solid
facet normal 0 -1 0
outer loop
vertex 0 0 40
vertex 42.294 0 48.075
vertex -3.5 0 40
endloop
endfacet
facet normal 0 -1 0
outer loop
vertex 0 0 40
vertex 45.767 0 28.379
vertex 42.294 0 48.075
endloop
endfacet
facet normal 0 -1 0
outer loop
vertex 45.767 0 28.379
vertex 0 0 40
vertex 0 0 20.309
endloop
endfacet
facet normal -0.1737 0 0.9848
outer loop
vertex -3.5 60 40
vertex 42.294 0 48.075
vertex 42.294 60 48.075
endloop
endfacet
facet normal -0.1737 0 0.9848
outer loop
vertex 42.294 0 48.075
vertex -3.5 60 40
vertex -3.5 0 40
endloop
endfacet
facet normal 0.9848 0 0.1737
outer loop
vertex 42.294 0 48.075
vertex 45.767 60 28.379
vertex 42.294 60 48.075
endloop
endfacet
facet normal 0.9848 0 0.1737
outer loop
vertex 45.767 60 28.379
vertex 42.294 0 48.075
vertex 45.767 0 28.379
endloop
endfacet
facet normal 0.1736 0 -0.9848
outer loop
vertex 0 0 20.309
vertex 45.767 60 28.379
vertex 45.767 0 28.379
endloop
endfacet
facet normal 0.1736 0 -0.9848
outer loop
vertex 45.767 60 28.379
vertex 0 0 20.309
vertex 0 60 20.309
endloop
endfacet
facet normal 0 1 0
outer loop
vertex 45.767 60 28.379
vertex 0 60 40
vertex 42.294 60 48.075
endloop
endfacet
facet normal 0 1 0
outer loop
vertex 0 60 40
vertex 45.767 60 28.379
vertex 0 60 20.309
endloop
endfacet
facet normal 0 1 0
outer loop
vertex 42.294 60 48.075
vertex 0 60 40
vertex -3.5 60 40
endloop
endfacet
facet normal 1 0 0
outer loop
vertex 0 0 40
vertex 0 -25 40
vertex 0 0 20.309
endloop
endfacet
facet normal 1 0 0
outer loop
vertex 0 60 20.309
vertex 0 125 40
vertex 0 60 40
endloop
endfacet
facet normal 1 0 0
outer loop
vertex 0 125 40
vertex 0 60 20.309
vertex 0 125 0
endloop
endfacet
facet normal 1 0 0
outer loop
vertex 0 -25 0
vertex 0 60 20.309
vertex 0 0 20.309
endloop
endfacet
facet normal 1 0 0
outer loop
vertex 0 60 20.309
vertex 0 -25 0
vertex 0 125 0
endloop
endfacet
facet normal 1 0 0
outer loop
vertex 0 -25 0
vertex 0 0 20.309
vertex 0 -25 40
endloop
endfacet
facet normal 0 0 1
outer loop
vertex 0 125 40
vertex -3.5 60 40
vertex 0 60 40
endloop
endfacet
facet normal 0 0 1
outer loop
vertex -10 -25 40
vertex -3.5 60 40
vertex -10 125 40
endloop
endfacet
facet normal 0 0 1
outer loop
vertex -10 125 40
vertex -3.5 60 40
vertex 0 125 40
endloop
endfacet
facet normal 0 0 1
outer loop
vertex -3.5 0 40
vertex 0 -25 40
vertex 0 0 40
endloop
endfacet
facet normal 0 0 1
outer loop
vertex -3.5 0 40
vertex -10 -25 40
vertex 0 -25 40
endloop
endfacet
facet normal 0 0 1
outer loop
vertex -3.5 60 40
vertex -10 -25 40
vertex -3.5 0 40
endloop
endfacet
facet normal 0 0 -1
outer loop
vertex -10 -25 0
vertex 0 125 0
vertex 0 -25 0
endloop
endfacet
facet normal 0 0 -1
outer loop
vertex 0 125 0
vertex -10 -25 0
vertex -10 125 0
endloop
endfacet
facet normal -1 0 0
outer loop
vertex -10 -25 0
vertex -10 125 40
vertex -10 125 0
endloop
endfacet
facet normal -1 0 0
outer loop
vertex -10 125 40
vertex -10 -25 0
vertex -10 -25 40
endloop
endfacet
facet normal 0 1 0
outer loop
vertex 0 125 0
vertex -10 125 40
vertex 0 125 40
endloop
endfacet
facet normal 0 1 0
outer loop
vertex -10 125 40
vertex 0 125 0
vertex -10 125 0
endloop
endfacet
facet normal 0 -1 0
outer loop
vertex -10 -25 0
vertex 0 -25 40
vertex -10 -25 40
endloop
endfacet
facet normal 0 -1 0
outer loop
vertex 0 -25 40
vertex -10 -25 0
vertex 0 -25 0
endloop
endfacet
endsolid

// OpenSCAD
scale(10){
rotate([0,-10,0])translate([0,0,2])cube([5,6,2]);
translate([-1,-2.5,0])cube([1,15,4]);
}
